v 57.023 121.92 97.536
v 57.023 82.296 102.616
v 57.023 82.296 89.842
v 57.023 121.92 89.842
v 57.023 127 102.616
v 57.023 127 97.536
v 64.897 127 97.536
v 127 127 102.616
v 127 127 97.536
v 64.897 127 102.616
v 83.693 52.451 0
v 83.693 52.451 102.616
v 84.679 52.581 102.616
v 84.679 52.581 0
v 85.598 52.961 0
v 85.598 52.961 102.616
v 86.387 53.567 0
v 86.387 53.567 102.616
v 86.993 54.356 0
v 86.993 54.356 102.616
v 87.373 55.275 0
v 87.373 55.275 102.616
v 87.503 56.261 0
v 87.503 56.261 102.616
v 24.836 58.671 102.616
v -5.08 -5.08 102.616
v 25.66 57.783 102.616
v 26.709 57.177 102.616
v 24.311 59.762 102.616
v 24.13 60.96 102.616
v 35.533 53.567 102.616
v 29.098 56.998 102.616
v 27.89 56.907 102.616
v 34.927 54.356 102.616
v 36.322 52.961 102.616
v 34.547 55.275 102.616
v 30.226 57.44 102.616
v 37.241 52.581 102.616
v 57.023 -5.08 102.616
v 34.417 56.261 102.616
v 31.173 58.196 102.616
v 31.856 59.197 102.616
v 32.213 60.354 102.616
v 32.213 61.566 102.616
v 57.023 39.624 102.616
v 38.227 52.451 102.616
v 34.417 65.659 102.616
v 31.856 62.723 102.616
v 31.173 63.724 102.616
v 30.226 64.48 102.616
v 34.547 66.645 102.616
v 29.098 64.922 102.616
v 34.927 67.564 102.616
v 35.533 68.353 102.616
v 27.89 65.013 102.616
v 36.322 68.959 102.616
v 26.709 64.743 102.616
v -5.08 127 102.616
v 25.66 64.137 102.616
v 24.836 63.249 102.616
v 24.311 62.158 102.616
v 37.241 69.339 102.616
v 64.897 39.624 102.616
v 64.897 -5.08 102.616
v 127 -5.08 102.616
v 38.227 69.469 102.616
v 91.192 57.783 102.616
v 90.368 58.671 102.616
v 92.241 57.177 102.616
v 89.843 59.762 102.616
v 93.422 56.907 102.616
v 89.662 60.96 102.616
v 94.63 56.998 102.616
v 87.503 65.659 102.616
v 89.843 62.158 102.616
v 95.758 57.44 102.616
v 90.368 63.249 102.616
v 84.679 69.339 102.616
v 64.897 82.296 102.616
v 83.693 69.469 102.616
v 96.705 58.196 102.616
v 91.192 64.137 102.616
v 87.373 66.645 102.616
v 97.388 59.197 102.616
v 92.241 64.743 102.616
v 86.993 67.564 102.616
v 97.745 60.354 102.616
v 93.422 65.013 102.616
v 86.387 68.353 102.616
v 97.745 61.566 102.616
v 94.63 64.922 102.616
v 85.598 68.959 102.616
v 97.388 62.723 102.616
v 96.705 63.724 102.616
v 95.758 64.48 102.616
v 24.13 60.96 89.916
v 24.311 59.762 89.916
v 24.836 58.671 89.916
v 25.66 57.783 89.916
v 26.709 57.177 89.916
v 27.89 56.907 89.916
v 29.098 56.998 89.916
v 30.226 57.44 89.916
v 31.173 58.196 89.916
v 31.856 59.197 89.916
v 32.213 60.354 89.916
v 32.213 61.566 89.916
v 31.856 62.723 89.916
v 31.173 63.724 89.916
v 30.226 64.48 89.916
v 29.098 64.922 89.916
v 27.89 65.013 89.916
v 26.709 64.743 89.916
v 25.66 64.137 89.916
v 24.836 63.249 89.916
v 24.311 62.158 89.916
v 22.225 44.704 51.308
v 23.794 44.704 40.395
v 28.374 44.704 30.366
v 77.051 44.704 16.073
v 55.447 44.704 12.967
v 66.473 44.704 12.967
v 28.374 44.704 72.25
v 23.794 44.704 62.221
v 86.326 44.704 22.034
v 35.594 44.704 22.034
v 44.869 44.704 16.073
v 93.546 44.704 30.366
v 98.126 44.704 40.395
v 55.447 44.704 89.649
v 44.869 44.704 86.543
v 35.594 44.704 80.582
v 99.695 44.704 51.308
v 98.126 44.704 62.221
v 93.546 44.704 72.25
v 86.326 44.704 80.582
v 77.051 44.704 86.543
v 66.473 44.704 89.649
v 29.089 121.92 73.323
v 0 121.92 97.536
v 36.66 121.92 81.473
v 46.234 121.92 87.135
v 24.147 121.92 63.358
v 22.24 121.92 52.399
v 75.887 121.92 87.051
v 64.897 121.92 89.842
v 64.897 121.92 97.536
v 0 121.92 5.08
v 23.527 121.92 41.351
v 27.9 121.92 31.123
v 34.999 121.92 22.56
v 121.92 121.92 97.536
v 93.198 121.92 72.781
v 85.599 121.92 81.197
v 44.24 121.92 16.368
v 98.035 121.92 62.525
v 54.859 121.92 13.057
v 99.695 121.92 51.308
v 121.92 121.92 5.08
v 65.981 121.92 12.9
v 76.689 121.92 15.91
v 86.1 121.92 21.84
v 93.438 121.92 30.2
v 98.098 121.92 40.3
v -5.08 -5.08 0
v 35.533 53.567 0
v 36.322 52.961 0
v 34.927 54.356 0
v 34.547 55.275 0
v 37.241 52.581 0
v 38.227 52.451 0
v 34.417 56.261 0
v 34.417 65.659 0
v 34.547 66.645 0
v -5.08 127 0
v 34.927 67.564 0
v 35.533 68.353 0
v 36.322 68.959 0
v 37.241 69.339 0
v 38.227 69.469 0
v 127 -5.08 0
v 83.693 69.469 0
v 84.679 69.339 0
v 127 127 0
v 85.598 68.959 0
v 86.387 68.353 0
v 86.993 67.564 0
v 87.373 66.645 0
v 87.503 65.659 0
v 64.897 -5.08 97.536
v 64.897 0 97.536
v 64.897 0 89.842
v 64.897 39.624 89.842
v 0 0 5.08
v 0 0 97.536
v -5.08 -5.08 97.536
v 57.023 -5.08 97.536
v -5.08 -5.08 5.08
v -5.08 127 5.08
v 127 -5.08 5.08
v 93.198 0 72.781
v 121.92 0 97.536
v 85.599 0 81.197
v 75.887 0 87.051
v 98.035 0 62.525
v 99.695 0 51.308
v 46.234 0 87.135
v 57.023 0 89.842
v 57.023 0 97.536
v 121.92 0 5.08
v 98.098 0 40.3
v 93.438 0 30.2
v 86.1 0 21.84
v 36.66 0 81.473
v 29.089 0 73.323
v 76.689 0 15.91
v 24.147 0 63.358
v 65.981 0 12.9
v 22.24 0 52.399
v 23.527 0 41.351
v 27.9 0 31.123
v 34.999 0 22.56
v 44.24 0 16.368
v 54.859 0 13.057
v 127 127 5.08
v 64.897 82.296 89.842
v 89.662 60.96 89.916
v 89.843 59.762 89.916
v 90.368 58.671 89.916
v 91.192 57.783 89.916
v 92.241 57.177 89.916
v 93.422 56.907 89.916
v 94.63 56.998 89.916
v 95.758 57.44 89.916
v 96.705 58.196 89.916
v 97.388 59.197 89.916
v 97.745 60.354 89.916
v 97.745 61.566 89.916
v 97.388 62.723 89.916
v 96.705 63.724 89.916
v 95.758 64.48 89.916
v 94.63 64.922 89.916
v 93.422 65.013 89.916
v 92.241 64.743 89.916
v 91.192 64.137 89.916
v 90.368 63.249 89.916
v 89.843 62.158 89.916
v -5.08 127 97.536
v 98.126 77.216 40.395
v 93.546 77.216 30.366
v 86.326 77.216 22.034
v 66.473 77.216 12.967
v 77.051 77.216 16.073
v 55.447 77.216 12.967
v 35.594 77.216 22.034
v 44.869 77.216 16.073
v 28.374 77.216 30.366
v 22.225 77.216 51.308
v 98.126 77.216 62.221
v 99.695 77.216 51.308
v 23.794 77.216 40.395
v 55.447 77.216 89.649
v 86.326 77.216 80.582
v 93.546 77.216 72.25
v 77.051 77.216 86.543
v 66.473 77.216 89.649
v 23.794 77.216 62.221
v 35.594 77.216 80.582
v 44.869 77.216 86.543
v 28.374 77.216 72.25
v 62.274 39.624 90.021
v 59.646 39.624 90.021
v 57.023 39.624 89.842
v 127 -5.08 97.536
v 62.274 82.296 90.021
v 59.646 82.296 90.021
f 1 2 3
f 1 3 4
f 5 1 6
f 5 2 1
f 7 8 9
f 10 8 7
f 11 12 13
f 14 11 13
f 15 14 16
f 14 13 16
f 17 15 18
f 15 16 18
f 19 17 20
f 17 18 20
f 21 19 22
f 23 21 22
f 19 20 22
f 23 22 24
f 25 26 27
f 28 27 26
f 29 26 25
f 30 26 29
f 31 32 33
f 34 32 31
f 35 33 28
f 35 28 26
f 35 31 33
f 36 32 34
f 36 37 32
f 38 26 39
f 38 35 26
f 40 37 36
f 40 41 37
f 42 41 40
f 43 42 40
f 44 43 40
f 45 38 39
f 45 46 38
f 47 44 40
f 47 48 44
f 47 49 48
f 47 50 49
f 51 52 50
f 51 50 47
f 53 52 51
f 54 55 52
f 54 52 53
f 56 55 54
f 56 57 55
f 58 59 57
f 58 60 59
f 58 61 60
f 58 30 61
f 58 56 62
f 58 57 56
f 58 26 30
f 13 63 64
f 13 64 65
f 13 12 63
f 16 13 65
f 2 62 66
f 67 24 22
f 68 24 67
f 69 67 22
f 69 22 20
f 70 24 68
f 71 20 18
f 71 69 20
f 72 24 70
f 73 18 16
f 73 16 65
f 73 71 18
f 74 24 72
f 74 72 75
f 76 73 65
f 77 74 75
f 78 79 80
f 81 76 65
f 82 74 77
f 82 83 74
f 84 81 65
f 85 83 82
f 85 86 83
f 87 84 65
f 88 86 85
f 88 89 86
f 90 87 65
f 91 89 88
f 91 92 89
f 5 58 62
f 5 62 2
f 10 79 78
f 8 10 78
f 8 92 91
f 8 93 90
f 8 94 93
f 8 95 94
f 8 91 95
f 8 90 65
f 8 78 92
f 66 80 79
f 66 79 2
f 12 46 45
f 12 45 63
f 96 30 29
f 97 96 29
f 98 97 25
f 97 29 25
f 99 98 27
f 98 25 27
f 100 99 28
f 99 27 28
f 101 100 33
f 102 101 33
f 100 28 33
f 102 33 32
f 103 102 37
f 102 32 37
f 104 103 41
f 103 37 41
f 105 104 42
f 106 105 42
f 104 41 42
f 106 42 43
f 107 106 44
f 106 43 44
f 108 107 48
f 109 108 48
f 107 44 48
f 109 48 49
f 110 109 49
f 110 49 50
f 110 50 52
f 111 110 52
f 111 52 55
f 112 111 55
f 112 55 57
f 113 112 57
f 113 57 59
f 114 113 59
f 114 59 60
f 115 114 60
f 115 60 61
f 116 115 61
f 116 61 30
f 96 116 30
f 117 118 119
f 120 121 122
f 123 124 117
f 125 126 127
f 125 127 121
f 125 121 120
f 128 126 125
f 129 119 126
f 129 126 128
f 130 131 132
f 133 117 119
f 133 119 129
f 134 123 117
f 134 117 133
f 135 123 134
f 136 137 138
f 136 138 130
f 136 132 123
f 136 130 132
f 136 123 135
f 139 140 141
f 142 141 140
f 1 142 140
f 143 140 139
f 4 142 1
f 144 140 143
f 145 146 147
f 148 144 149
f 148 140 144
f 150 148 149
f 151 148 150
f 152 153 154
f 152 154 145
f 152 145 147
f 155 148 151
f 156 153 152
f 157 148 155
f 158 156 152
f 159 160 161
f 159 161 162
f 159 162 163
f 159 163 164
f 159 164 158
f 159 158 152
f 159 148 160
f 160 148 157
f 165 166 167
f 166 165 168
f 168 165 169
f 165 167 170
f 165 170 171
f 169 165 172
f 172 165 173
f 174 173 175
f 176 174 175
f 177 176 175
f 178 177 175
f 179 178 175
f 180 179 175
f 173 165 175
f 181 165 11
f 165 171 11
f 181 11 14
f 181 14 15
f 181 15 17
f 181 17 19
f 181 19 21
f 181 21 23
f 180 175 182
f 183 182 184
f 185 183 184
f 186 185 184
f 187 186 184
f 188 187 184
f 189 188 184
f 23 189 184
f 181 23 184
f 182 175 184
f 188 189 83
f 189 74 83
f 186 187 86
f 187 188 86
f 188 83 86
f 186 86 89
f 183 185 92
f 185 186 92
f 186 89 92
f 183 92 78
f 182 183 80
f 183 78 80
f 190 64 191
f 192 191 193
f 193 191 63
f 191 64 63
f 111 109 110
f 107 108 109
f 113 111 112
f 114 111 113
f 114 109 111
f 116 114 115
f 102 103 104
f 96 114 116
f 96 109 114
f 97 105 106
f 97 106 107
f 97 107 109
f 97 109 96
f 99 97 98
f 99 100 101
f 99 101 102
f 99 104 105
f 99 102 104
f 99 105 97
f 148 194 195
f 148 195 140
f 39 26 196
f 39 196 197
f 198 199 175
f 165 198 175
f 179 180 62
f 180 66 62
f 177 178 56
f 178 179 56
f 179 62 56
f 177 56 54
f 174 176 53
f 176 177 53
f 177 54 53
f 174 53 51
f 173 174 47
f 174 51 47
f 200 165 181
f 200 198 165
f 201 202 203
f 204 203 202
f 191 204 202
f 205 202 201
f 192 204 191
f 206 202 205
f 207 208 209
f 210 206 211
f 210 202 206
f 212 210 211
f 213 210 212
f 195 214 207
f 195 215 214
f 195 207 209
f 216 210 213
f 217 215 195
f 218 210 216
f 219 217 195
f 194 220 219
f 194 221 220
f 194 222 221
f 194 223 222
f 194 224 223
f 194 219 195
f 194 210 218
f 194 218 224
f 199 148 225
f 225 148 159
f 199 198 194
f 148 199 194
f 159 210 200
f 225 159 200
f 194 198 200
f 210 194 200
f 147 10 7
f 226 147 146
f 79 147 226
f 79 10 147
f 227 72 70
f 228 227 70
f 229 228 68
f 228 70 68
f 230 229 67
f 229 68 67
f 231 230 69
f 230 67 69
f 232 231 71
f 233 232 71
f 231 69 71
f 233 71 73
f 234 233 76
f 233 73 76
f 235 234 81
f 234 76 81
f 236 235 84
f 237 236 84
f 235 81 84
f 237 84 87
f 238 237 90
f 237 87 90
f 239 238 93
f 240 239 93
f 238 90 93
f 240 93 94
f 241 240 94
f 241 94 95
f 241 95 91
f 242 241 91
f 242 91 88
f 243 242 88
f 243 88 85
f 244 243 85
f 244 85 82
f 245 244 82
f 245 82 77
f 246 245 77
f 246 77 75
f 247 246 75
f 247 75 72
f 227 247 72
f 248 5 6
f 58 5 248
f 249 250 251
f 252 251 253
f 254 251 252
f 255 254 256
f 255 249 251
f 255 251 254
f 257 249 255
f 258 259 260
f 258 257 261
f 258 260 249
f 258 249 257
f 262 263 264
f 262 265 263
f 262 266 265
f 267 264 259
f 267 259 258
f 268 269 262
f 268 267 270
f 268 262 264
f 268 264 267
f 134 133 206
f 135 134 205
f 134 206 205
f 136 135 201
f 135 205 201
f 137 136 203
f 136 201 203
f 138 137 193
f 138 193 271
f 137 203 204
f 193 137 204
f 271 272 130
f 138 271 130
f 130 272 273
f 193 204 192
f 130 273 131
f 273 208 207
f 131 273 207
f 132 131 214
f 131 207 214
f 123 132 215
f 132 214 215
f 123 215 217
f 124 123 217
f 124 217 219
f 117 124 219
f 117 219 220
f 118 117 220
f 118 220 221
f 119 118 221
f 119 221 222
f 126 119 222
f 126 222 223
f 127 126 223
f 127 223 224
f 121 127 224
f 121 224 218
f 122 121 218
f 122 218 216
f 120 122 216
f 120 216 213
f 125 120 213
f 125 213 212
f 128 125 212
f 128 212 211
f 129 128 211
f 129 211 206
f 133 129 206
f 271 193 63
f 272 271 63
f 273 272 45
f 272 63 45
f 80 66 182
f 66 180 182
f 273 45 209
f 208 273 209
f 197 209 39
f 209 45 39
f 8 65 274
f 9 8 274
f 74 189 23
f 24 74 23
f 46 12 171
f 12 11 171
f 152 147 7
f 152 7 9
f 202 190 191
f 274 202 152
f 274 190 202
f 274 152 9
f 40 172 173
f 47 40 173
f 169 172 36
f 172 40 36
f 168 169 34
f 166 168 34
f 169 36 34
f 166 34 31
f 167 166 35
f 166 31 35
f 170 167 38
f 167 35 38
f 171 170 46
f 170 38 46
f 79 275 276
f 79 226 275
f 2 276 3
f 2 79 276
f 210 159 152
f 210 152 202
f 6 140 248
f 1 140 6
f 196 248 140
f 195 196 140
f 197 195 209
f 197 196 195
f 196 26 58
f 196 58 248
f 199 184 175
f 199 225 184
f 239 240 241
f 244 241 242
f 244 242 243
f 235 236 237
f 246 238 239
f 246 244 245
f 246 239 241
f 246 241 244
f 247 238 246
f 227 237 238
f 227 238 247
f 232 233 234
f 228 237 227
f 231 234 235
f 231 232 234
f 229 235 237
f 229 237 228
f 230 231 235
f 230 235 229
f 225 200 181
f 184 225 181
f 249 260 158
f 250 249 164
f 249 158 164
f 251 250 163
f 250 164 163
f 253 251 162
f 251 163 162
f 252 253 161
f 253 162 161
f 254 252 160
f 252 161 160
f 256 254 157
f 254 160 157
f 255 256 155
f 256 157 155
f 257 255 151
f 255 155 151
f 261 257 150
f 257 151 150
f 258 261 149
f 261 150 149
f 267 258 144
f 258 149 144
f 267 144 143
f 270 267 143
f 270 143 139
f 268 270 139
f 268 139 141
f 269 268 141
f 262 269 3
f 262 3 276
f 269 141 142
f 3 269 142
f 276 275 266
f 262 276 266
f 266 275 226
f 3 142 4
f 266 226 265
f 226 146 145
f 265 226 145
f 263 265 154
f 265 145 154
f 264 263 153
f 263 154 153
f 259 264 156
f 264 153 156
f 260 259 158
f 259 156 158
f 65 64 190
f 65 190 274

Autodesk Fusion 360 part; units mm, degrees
sketch "Sketch1" plane through (0, 0, 0) normal (0, 0, 1) x (1, 0, 0)
  line L0 (0, 121.92) -> (121.92, 121.92)
  line L1 (121.92, 121.92) -> (121.92, 0)
  line L2 (121.92, 0) -> (0, 0)
  line L3 (0, 0) -> (0, 121.92)
  line L4 (34.417, 69.469) -> (87.503, 69.469)
  line L5 (87.503, 69.469) -> (87.503, 52.451)
  line L6 (87.503, 52.451) -> (34.417, 52.451)
  line L7 (34.417, 52.451) -> (34.417, 69.469)
  dimension "d1" = 121.92
  dimension "d2" = 121.92
  dimension "d3" = 17.018
  dimension "d4" = 53.086
  dimension "d5" = 34.417
  dimension "d6" = 52.451
extrude "Extrude1" add sketch "Sketch1" along normal blind 102.616
sketch "Sketch2" plane through (0, 0, 0) normal (0, -1, 0) x (1, 0, 0)
  line L0 (0, 0) -> (121.92, 0)
  line L1 (121.92, 0) -> (121.92, 102.616)
  line L2 (121.92, 102.616) -> (0, 102.616)
  line L3 (0, 102.616) -> (0, 0)
  line L4 (-5.08, 102.616) -> (127, 102.616)
  line L5 (127, 102.616) -> (127, 97.536)
  line L6 (127, 97.536) -> (-5.08, 97.536)
  line L7 (-5.08, 97.536) -> (-5.08, 102.616)
  line L8 (-5.08, 0) -> (127, 0)
  line L9 (127, 0) -> (127, 5.08)
  line L10 (127, 5.08) -> (-5.08, 5.08)
  line L11 (-5.08, 5.08) -> (-5.08, 0)
  dimension "d9" = 5.08
  dimension "d10" = 132.08
  dimension "d11" = 5.08
  dimension "d12" = 132.08
  dimension "d13" = 5.08
  dimension "d14" = 5.08
extrude "Extrude2" add sketch "Sketch2" along normal blind 5.08 contours L0 L1 L3 L8 L10 | L3 L8 L10 L11 | L1 L8 L9 L10 | L3 L4 L6 L7 | L1 L2 L3 L4 L6 | L1 L4 L5 L6
sketch "Sketch3" plane through (121.92, 0, 0) normal (1, 0, 0) x (0, 1, 0)
  line L0 (0, 0) -> (121.92, 0)
  line L1 (121.92, 0) -> (121.92, 102.616)
  line L2 (121.92, 102.616) -> (0, 102.616)
  line L3 (0, 102.616) -> (0, 97.536)
  line L4 (0, 97.536) -> (0, 5.08)
  line L5 (0, 5.08) -> (0, 0)
  line L6 (0, 102.616) -> (121.92, 102.616)
  line L7 (121.92, 102.616) -> (121.92, 97.536)
  line L8 (121.92, 97.536) -> (0, 97.536)
  line L9 (0, 97.536) -> (0, 102.616)
  line L10 (0, 0) -> (121.92, 0)
  line L11 (121.92, 0) -> (121.92, 5.08)
  line L12 (121.92, 5.08) -> (0, 5.08)
  line L13 (0, 5.08) -> (0, 0)
  dimension "d17" = 5.08
  dimension "d18" = 5.08
extrude "Extrude3" add sketch "Sketch3" along normal blind 5.08 contours L0 L1 L5 L10 L11 L12 L13 | L1 L2 L3 L6 L7 L8 L9
sketch "Sketch4" plane through (0, 121.92, 0) normal (0, 1, 0) x (-1, 0, 0)
  line L0 (-127, 0) -> (0, 0)
  line L1 (0, 0) -> (0, 102.616)
  line L2 (0, 102.616) -> (-127, 102.616)
  line L3 (-127, 102.616) -> (-127, 97.536)
  line L4 (-127, 97.536) -> (-121.92, 97.536)
  line L5 (-121.92, 97.536) -> (-121.92, 5.08)
  line L6 (-121.92, 5.08) -> (-127, 5.08)
  line L7 (-127, 5.08) -> (-127, 0)
  line L8 (-127, 102.616) -> (5.08, 102.616)
  line L9 (5.08, 102.616) -> (5.08, 97.536)
  line L10 (5.08, 97.536) -> (-127, 97.536)
  line L11 (-127, 97.536) -> (-127, 102.616)
  line L12 (-127, 5.08) -> (5.08, 5.08)
  line L13 (5.08, 5.08) -> (5.08, 0)
  line L14 (5.08, 0) -> (-127, 0)
  line L15 (-127, 0) -> (-127, 5.08)
  dimension "d21" = 5.08
  dimension "d22" = 132.08
  dimension "d23" = 132.08
  dimension "d24" = 5.08
extrude "Extrude4" add sketch "Sketch4" along normal blind 5.08 contours L0 L1 L6 L7 L12 L14 L15 | L1 L12 L13 L14 | L1 L2 L3 L4 L8 L10 L11 | L1 L8 L9 L10
sketch "Sketch5" plane through (0, 0, 0) normal (-1, 0, 0) x (0, -1, 0)
  line L0 (-121.92, 0) -> (0, 0)
  line L1 (0, 0) -> (0, 5.08)
  line L2 (0, 5.08) -> (0, 97.536)
  line L3 (0, 97.536) -> (0, 102.616)
  line L4 (0, 102.616) -> (-121.92, 102.616)
  line L5 (-121.92, 102.616) -> (-121.92, 97.536)
  line L6 (-121.92, 97.536) -> (-121.92, 5.08)
  line L7 (-121.92, 5.08) -> (-121.92, 0)
  line L8 (-121.92, 102.616) -> (0, 102.616)
  line L9 (0, 102.616) -> (0, 97.536)
  line L10 (0, 97.536) -> (-121.92, 97.536)
  line L11 (-121.92, 97.536) -> (-121.92, 102.616)
  line L12 (-121.92, 5.08) -> (0, 5.08)
  line L13 (0, 5.08) -> (0, 0)
  line L14 (0, 0) -> (-121.92, 0)
  line L15 (-121.92, 0) -> (-121.92, 5.08)
  dimension "d27" = 5.08
  dimension "d28" = 5.08
extrude "Extrude5" add sketch "Sketch5" along normal blind 5.08 contours L0 L1 L7 L12 L13 L14 L15 | L3 L4 L5 L8 L9 L10 L11
sketch "Sketch6" plane through (0, 0, 0) normal (0, -1, 0) x (1, 0, 0)
  line L0 (0, 5.08) -> (121.92, 5.08)
  line L1 (121.92, 5.08) -> (121.92, 97.536)
  line L2 (121.92, 97.536) -> (0, 97.536)
  line L3 (0, 97.536) -> (0, 5.08)
  circle A0 centre (60.96, 51.308) radius 38.735
  line L4 (127, 102.616) -> (-5.08, 102.616)
  dimension "d31" = 77.47
  dimension "d32" = 51.308
  dimension "d33" = 60.96
extrude "Extrude6" cut sketch "Sketch6" against normal blind 44.704 contours A0
ref_plane "WorkPlane1" through (0, 60.96, 0) normal (0, 1, 0) x (0, 0, 1)
mirror "Mirror1" about plane through (0, 60.96, 0) normal (0, 1, 0) of "Extrude6"
sketch "Sketch7" plane through (0, 0, 102.616) normal (0, 0, 1) x (-1, 0, 0)
  line L0 (-87.503, -52.451) -> (-34.417, -52.451)
  line L1 (-34.417, -52.451) -> (-34.417, -69.469)
  line L2 (-34.417, -69.469) -> (-87.503, -69.469)
  line L3 (-87.503, -69.469) -> (-87.503, -52.451)
  line L4 (5.08, -127) -> (5.08, 5.08)
  line L5 (5.08, 5.08) -> (-127, 5.08)
  line L6 (-127, 5.08) -> (-127, -127)
  line L7 (-127, -127) -> (5.08, -127)
  line L8 (-57.023, -127) -> (-64.897, -127)
  line L9 (-64.897, -127) -> (-64.897, -82.296)
  line L10 (-64.897, -82.296) -> (-57.023, -82.296)
  line L11 (-57.023, -82.296) -> (-57.023, -127)
  line L12 (-33.7438, -60.96) -> (-1.1636, -60.96)
  line L13 (-64.897, -39.624) -> (-57.023, -39.624)
  line L14 (-57.023, -39.624) -> (-57.023, 5.08)
  line L15 (-64.897, 5.08) -> (-64.897, -39.624)
  line L16 (-57.023, 5.08) -> (-64.897, 5.08)
  dimension "d39" = 7.874
  dimension "d40" = 62.103
  dimension "d41" = 44.704
extrude "Extrude7" cut sketch "Sketch7" against normal blind 15.24 contours L7 L8 L9 L10 L11 | L5 L13 L14 L15 L16
sketch "Sketch8" plane through (0, 0, 102.616) normal (0, 0, 1) x (-1, 0, 0)
  line L0 (-87.503, -52.451) -> (-34.417, -52.451)
  line L1 (-34.417, -52.451) -> (-34.417, -69.469)
  line L2 (-34.417, -69.469) -> (-87.503, -69.469)
  line L3 (-87.503, -69.469) -> (-87.503, -52.451)
  line L4 (-64.897, -127) -> (-64.897, -82.296)
  line L5 (-64.897, -82.296) -> (-57.023, -82.296)
  line L6 (-57.023, -82.296) -> (-57.023, -127)
  line L7 (-57.023, -127) -> (5.08, -127)
  line L8 (5.08, -127) -> (5.08, 5.08)
  line L9 (5.08, 5.08) -> (-57.023, 5.08)
  line L10 (-57.023, 5.08) -> (-57.023, -39.624)
  line L11 (-57.023, -39.624) -> (-64.897, -39.624)
  line L12 (-64.897, -39.624) -> (-64.897, 5.08)
  line L13 (-64.897, 5.08) -> (-127, 5.08)
  line L14 (-127, 5.08) -> (-127, -127)
  line L15 (-127, -127) -> (-64.897, -127)
  circle A0 centre (-28.194, -60.96) radius 4.064
  circle A1 centre (-93.726, -60.96) radius 4.064
  dimension "d44" = 8.128
  dimension "d45" = 8.128
  dimension "d46" = 33.274
  dimension "d47" = 98.806
  dimension "d48" = 66.04
  dimension "d49" = 66.04
extrude "Extrude8" cut sketch "Sketch8" against normal blind 12.7 contours A0 | A1
thread "Thread1"
thread "Thread2"
fillet "Fillet1" radius 3.81 4 edges at (87.503, 69.469, 51.308) (34.417, 69.469, 51.308) (34.417, 52.451, 51.308) (87.503, 52.451, 51.308)
